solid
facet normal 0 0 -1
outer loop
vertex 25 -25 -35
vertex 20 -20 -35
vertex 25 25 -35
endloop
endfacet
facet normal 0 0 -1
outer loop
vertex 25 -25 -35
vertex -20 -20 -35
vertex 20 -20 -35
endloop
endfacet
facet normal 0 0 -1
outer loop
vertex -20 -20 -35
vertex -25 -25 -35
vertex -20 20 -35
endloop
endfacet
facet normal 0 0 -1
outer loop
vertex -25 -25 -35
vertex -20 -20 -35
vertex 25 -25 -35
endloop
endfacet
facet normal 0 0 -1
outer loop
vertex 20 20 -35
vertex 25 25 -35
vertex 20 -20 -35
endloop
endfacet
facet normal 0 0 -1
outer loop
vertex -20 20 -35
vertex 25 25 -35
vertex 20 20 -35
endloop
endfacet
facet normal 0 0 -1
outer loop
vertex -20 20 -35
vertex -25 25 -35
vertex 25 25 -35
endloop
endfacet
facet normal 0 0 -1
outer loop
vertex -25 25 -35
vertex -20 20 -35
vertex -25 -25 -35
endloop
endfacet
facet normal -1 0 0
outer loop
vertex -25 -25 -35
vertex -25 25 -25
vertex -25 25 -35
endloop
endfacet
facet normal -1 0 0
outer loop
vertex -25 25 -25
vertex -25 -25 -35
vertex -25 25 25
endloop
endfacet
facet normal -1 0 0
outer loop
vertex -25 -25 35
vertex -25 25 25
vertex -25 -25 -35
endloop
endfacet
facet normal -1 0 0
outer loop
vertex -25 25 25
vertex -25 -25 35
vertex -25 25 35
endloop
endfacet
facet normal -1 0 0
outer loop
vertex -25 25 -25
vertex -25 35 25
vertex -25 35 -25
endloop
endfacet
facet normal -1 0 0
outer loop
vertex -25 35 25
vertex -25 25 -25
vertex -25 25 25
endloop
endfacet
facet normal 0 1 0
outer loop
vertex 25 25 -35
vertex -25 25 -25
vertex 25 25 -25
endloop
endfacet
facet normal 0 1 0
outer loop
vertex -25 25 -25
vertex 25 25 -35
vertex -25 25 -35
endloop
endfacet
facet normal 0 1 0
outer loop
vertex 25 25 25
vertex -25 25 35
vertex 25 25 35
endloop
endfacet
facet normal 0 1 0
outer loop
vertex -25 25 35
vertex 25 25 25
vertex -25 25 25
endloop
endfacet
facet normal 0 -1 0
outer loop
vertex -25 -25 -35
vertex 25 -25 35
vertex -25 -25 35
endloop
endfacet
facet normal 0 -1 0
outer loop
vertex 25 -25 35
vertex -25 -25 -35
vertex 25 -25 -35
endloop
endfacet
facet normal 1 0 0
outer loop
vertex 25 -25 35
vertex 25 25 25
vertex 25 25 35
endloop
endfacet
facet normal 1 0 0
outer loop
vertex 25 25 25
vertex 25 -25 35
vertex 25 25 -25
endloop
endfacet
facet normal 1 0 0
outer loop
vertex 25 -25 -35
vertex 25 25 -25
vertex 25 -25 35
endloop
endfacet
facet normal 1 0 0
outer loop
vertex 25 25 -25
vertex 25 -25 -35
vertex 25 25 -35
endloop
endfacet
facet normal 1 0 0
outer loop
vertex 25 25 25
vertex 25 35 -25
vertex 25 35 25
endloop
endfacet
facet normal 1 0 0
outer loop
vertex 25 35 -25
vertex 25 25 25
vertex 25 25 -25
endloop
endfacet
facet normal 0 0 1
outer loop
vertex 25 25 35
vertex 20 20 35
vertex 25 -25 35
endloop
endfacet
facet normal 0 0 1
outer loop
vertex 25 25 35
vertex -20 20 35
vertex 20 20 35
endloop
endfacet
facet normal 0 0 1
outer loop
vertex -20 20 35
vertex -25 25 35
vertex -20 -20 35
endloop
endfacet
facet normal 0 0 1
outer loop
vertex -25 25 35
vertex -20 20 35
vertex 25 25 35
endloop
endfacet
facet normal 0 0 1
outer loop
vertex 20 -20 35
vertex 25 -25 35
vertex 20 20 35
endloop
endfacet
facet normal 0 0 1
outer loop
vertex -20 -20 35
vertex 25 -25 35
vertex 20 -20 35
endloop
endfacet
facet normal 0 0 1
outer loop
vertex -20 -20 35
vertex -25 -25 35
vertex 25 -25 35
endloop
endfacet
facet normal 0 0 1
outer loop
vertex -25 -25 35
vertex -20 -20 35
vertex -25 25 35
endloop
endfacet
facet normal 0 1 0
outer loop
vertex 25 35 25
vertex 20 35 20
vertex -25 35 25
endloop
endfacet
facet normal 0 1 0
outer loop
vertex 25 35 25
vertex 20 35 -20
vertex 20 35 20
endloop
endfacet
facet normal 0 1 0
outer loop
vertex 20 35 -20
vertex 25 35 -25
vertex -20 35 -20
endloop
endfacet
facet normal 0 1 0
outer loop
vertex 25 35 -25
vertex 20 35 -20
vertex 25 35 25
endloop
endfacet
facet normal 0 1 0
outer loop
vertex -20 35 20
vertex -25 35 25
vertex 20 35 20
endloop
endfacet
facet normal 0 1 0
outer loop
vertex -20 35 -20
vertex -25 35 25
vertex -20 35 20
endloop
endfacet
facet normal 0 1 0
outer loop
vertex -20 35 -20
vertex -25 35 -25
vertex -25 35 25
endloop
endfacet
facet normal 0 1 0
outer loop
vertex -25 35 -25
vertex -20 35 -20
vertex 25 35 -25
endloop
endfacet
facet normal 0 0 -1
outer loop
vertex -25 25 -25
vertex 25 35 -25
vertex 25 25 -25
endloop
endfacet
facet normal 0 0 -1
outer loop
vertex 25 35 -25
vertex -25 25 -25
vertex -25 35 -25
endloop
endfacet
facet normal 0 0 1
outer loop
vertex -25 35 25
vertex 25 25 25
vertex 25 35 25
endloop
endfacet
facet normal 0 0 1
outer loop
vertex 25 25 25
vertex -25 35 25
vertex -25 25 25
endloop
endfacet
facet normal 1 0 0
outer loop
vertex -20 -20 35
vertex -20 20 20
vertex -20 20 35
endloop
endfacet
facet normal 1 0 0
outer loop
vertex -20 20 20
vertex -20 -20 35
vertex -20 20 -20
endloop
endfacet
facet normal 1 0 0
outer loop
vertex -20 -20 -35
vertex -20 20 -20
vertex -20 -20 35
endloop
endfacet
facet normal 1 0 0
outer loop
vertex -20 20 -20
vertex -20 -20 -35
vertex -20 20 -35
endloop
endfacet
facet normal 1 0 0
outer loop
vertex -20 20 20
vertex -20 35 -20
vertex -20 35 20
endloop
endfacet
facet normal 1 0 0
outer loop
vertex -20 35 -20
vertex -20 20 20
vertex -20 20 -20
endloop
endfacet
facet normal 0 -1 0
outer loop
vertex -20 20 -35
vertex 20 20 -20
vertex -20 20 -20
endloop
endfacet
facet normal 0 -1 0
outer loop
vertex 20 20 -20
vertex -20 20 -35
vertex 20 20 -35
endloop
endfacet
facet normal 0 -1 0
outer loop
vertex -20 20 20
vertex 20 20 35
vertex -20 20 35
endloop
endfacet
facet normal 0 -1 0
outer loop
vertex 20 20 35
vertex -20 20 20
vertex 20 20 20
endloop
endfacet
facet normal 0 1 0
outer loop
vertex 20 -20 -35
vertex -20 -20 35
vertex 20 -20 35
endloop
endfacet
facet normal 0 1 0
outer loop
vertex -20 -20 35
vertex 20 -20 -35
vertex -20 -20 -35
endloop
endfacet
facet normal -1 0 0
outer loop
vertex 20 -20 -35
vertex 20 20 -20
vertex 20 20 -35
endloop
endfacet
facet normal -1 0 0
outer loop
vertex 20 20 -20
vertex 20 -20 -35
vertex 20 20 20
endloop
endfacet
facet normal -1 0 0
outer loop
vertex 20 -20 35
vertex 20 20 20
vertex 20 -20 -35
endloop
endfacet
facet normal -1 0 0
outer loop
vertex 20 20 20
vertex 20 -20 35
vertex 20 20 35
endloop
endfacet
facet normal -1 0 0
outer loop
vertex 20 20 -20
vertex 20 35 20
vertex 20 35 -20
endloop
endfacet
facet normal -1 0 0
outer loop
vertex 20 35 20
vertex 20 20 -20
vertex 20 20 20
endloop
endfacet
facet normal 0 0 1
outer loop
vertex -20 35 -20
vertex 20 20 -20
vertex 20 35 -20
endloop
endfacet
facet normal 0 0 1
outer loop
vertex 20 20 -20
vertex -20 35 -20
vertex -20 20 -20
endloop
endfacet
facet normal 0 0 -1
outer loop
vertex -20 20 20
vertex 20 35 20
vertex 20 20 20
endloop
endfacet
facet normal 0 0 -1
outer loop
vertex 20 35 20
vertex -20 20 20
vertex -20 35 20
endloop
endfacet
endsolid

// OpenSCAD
// Start: lazy_union
default_5_default_5();
// End: lazy_union

// Modules.

// 'PartMaterial undef-default - default 5.0'
module default_5_default_5() {
  // 'None : _combine_solids_and_holes'
  union() {
    // '_combine_solids_and_holes'
    difference() {
      // 'default : _combine_solids_and_holes'
      union() {
        // 'LHS'
        multmatrix(m=[[1.0, 0.0, 0.0, 0.0], [-0.0, -1.0, -0.0, -0.0], [-0.0, -0.0, -1.0, -17.5], [0.0, 0.0, 0.0, 1.0]]) {
          // 'outer'
          multmatrix(m=[[1.0, 0.0, 0.0, -25.0], [0.0, 1.0, 0.0, -25.0], [0.0, 0.0, 1.0, -17.5], [0.0, 0.0, 0.0, 1.0]]) {
            // 'outer : _combine_solids_and_holes'
            union() {
              // 'outer'
              cube(size=[50.0, 50.0, 35.0]);
            }
          }
        }
        // 'RHS'
        multmatrix(m=[[1.0, 0.0, 0.0, 0.0], [0.0, 1.0, 0.0, 0.0], [0.0, 0.0, 1.0, 17.5], [0.0, 0.0, 0.0, 1.0]]) {
          // 'outer'
          multmatrix(m=[[1.0, 0.0, 0.0, -25.0], [0.0, 1.0, 0.0, -25.0], [0.0, 0.0, 1.0, -17.5], [0.0, 0.0, 0.0, 1.0]]) {
            // 'outer : _combine_solids_and_holes'
            union() {
              // 'outer'
              cube(size=[50.0, 50.0, 35.0]);
            }
          }
        }
        // 'stem'
        multmatrix(m=[[1.0, 0.0, 0.0, 0.0], [0.0, 0.0, 1.0, 17.5], [0.0, -1.0, 0.0, 0.0], [0.0, 0.0, 0.0, 1.0]]) {
          // 'outer'
          multmatrix(m=[[1.0, 0.0, 0.0, -25.0], [0.0, 1.0, 0.0, -25.0], [0.0, 0.0, 1.0, -17.5], [0.0, 0.0, 0.0, 1.0]]) {
            // 'outer : _combine_solids_and_holes'
            union() {
              // 'outer'
              cube(size=[50.0, 50.0, 35.0]);
            }
          }
        }
      }
      // 'LHS'
      multmatrix(m=[[1.0, 0.0, 0.0, 0.0], [-0.0, -1.0, -0.0, -0.0], [-0.0, -0.0, -1.0, -17.5], [0.0, 0.0, 0.0, 1.0]]) {
        // 'LHS'
        multmatrix(m=[[1.0, 0.0, 0.0, -20.0], [0.0, 1.0, 0.0, -20.0], [0.0, 0.0, 1.0, -17.5005], [0.0, 0.0, 0.0, 1.0]]) {
          // 'hole : _combine_solids_and_holes'
          union() {
            // 'hole'
            cube(size=[40.0, 40.0, 35.001]);
          }
        }
      }
      // 'RHS'
      multmatrix(m=[[1.0, 0.0, 0.0, 0.0], [0.0, 1.0, 0.0, 0.0], [0.0, 0.0, 1.0, 17.5], [0.0, 0.0, 0.0, 1.0]]) {
        // 'RHS'
        multmatrix(m=[[1.0, 0.0, 0.0, -20.0], [0.0, 1.0, 0.0, -20.0], [0.0, 0.0, 1.0, -17.5005], [0.0, 0.0, 0.0, 1.0]]) {
          // 'hole : _combine_solids_and_holes'
          union() {
            // 'hole'
            cube(size=[40.0, 40.0, 35.001]);
          }
        }
      }
      // 'stem'
      multmatrix(m=[[1.0, 0.0, 0.0, 0.0], [0.0, 0.0, 1.0, 17.5], [0.0, -1.0, 0.0, 0.0], [0.0, 0.0, 0.0, 1.0]]) {
        // 'stem'
        multmatrix(m=[[1.0, 0.0, 0.0, -20.0], [0.0, 1.0, 0.0, -20.0], [0.0, 0.0, 1.0, -17.5005], [0.0, 0.0, 0.0, 1.0]]) {
          // 'hole : _combine_solids_and_holes'
          union() {
            // 'hole'
            cube(size=[40.0, 40.0, 35.001]);
          }
        }
      }
    }
  }
} // end module default_5_default_5
